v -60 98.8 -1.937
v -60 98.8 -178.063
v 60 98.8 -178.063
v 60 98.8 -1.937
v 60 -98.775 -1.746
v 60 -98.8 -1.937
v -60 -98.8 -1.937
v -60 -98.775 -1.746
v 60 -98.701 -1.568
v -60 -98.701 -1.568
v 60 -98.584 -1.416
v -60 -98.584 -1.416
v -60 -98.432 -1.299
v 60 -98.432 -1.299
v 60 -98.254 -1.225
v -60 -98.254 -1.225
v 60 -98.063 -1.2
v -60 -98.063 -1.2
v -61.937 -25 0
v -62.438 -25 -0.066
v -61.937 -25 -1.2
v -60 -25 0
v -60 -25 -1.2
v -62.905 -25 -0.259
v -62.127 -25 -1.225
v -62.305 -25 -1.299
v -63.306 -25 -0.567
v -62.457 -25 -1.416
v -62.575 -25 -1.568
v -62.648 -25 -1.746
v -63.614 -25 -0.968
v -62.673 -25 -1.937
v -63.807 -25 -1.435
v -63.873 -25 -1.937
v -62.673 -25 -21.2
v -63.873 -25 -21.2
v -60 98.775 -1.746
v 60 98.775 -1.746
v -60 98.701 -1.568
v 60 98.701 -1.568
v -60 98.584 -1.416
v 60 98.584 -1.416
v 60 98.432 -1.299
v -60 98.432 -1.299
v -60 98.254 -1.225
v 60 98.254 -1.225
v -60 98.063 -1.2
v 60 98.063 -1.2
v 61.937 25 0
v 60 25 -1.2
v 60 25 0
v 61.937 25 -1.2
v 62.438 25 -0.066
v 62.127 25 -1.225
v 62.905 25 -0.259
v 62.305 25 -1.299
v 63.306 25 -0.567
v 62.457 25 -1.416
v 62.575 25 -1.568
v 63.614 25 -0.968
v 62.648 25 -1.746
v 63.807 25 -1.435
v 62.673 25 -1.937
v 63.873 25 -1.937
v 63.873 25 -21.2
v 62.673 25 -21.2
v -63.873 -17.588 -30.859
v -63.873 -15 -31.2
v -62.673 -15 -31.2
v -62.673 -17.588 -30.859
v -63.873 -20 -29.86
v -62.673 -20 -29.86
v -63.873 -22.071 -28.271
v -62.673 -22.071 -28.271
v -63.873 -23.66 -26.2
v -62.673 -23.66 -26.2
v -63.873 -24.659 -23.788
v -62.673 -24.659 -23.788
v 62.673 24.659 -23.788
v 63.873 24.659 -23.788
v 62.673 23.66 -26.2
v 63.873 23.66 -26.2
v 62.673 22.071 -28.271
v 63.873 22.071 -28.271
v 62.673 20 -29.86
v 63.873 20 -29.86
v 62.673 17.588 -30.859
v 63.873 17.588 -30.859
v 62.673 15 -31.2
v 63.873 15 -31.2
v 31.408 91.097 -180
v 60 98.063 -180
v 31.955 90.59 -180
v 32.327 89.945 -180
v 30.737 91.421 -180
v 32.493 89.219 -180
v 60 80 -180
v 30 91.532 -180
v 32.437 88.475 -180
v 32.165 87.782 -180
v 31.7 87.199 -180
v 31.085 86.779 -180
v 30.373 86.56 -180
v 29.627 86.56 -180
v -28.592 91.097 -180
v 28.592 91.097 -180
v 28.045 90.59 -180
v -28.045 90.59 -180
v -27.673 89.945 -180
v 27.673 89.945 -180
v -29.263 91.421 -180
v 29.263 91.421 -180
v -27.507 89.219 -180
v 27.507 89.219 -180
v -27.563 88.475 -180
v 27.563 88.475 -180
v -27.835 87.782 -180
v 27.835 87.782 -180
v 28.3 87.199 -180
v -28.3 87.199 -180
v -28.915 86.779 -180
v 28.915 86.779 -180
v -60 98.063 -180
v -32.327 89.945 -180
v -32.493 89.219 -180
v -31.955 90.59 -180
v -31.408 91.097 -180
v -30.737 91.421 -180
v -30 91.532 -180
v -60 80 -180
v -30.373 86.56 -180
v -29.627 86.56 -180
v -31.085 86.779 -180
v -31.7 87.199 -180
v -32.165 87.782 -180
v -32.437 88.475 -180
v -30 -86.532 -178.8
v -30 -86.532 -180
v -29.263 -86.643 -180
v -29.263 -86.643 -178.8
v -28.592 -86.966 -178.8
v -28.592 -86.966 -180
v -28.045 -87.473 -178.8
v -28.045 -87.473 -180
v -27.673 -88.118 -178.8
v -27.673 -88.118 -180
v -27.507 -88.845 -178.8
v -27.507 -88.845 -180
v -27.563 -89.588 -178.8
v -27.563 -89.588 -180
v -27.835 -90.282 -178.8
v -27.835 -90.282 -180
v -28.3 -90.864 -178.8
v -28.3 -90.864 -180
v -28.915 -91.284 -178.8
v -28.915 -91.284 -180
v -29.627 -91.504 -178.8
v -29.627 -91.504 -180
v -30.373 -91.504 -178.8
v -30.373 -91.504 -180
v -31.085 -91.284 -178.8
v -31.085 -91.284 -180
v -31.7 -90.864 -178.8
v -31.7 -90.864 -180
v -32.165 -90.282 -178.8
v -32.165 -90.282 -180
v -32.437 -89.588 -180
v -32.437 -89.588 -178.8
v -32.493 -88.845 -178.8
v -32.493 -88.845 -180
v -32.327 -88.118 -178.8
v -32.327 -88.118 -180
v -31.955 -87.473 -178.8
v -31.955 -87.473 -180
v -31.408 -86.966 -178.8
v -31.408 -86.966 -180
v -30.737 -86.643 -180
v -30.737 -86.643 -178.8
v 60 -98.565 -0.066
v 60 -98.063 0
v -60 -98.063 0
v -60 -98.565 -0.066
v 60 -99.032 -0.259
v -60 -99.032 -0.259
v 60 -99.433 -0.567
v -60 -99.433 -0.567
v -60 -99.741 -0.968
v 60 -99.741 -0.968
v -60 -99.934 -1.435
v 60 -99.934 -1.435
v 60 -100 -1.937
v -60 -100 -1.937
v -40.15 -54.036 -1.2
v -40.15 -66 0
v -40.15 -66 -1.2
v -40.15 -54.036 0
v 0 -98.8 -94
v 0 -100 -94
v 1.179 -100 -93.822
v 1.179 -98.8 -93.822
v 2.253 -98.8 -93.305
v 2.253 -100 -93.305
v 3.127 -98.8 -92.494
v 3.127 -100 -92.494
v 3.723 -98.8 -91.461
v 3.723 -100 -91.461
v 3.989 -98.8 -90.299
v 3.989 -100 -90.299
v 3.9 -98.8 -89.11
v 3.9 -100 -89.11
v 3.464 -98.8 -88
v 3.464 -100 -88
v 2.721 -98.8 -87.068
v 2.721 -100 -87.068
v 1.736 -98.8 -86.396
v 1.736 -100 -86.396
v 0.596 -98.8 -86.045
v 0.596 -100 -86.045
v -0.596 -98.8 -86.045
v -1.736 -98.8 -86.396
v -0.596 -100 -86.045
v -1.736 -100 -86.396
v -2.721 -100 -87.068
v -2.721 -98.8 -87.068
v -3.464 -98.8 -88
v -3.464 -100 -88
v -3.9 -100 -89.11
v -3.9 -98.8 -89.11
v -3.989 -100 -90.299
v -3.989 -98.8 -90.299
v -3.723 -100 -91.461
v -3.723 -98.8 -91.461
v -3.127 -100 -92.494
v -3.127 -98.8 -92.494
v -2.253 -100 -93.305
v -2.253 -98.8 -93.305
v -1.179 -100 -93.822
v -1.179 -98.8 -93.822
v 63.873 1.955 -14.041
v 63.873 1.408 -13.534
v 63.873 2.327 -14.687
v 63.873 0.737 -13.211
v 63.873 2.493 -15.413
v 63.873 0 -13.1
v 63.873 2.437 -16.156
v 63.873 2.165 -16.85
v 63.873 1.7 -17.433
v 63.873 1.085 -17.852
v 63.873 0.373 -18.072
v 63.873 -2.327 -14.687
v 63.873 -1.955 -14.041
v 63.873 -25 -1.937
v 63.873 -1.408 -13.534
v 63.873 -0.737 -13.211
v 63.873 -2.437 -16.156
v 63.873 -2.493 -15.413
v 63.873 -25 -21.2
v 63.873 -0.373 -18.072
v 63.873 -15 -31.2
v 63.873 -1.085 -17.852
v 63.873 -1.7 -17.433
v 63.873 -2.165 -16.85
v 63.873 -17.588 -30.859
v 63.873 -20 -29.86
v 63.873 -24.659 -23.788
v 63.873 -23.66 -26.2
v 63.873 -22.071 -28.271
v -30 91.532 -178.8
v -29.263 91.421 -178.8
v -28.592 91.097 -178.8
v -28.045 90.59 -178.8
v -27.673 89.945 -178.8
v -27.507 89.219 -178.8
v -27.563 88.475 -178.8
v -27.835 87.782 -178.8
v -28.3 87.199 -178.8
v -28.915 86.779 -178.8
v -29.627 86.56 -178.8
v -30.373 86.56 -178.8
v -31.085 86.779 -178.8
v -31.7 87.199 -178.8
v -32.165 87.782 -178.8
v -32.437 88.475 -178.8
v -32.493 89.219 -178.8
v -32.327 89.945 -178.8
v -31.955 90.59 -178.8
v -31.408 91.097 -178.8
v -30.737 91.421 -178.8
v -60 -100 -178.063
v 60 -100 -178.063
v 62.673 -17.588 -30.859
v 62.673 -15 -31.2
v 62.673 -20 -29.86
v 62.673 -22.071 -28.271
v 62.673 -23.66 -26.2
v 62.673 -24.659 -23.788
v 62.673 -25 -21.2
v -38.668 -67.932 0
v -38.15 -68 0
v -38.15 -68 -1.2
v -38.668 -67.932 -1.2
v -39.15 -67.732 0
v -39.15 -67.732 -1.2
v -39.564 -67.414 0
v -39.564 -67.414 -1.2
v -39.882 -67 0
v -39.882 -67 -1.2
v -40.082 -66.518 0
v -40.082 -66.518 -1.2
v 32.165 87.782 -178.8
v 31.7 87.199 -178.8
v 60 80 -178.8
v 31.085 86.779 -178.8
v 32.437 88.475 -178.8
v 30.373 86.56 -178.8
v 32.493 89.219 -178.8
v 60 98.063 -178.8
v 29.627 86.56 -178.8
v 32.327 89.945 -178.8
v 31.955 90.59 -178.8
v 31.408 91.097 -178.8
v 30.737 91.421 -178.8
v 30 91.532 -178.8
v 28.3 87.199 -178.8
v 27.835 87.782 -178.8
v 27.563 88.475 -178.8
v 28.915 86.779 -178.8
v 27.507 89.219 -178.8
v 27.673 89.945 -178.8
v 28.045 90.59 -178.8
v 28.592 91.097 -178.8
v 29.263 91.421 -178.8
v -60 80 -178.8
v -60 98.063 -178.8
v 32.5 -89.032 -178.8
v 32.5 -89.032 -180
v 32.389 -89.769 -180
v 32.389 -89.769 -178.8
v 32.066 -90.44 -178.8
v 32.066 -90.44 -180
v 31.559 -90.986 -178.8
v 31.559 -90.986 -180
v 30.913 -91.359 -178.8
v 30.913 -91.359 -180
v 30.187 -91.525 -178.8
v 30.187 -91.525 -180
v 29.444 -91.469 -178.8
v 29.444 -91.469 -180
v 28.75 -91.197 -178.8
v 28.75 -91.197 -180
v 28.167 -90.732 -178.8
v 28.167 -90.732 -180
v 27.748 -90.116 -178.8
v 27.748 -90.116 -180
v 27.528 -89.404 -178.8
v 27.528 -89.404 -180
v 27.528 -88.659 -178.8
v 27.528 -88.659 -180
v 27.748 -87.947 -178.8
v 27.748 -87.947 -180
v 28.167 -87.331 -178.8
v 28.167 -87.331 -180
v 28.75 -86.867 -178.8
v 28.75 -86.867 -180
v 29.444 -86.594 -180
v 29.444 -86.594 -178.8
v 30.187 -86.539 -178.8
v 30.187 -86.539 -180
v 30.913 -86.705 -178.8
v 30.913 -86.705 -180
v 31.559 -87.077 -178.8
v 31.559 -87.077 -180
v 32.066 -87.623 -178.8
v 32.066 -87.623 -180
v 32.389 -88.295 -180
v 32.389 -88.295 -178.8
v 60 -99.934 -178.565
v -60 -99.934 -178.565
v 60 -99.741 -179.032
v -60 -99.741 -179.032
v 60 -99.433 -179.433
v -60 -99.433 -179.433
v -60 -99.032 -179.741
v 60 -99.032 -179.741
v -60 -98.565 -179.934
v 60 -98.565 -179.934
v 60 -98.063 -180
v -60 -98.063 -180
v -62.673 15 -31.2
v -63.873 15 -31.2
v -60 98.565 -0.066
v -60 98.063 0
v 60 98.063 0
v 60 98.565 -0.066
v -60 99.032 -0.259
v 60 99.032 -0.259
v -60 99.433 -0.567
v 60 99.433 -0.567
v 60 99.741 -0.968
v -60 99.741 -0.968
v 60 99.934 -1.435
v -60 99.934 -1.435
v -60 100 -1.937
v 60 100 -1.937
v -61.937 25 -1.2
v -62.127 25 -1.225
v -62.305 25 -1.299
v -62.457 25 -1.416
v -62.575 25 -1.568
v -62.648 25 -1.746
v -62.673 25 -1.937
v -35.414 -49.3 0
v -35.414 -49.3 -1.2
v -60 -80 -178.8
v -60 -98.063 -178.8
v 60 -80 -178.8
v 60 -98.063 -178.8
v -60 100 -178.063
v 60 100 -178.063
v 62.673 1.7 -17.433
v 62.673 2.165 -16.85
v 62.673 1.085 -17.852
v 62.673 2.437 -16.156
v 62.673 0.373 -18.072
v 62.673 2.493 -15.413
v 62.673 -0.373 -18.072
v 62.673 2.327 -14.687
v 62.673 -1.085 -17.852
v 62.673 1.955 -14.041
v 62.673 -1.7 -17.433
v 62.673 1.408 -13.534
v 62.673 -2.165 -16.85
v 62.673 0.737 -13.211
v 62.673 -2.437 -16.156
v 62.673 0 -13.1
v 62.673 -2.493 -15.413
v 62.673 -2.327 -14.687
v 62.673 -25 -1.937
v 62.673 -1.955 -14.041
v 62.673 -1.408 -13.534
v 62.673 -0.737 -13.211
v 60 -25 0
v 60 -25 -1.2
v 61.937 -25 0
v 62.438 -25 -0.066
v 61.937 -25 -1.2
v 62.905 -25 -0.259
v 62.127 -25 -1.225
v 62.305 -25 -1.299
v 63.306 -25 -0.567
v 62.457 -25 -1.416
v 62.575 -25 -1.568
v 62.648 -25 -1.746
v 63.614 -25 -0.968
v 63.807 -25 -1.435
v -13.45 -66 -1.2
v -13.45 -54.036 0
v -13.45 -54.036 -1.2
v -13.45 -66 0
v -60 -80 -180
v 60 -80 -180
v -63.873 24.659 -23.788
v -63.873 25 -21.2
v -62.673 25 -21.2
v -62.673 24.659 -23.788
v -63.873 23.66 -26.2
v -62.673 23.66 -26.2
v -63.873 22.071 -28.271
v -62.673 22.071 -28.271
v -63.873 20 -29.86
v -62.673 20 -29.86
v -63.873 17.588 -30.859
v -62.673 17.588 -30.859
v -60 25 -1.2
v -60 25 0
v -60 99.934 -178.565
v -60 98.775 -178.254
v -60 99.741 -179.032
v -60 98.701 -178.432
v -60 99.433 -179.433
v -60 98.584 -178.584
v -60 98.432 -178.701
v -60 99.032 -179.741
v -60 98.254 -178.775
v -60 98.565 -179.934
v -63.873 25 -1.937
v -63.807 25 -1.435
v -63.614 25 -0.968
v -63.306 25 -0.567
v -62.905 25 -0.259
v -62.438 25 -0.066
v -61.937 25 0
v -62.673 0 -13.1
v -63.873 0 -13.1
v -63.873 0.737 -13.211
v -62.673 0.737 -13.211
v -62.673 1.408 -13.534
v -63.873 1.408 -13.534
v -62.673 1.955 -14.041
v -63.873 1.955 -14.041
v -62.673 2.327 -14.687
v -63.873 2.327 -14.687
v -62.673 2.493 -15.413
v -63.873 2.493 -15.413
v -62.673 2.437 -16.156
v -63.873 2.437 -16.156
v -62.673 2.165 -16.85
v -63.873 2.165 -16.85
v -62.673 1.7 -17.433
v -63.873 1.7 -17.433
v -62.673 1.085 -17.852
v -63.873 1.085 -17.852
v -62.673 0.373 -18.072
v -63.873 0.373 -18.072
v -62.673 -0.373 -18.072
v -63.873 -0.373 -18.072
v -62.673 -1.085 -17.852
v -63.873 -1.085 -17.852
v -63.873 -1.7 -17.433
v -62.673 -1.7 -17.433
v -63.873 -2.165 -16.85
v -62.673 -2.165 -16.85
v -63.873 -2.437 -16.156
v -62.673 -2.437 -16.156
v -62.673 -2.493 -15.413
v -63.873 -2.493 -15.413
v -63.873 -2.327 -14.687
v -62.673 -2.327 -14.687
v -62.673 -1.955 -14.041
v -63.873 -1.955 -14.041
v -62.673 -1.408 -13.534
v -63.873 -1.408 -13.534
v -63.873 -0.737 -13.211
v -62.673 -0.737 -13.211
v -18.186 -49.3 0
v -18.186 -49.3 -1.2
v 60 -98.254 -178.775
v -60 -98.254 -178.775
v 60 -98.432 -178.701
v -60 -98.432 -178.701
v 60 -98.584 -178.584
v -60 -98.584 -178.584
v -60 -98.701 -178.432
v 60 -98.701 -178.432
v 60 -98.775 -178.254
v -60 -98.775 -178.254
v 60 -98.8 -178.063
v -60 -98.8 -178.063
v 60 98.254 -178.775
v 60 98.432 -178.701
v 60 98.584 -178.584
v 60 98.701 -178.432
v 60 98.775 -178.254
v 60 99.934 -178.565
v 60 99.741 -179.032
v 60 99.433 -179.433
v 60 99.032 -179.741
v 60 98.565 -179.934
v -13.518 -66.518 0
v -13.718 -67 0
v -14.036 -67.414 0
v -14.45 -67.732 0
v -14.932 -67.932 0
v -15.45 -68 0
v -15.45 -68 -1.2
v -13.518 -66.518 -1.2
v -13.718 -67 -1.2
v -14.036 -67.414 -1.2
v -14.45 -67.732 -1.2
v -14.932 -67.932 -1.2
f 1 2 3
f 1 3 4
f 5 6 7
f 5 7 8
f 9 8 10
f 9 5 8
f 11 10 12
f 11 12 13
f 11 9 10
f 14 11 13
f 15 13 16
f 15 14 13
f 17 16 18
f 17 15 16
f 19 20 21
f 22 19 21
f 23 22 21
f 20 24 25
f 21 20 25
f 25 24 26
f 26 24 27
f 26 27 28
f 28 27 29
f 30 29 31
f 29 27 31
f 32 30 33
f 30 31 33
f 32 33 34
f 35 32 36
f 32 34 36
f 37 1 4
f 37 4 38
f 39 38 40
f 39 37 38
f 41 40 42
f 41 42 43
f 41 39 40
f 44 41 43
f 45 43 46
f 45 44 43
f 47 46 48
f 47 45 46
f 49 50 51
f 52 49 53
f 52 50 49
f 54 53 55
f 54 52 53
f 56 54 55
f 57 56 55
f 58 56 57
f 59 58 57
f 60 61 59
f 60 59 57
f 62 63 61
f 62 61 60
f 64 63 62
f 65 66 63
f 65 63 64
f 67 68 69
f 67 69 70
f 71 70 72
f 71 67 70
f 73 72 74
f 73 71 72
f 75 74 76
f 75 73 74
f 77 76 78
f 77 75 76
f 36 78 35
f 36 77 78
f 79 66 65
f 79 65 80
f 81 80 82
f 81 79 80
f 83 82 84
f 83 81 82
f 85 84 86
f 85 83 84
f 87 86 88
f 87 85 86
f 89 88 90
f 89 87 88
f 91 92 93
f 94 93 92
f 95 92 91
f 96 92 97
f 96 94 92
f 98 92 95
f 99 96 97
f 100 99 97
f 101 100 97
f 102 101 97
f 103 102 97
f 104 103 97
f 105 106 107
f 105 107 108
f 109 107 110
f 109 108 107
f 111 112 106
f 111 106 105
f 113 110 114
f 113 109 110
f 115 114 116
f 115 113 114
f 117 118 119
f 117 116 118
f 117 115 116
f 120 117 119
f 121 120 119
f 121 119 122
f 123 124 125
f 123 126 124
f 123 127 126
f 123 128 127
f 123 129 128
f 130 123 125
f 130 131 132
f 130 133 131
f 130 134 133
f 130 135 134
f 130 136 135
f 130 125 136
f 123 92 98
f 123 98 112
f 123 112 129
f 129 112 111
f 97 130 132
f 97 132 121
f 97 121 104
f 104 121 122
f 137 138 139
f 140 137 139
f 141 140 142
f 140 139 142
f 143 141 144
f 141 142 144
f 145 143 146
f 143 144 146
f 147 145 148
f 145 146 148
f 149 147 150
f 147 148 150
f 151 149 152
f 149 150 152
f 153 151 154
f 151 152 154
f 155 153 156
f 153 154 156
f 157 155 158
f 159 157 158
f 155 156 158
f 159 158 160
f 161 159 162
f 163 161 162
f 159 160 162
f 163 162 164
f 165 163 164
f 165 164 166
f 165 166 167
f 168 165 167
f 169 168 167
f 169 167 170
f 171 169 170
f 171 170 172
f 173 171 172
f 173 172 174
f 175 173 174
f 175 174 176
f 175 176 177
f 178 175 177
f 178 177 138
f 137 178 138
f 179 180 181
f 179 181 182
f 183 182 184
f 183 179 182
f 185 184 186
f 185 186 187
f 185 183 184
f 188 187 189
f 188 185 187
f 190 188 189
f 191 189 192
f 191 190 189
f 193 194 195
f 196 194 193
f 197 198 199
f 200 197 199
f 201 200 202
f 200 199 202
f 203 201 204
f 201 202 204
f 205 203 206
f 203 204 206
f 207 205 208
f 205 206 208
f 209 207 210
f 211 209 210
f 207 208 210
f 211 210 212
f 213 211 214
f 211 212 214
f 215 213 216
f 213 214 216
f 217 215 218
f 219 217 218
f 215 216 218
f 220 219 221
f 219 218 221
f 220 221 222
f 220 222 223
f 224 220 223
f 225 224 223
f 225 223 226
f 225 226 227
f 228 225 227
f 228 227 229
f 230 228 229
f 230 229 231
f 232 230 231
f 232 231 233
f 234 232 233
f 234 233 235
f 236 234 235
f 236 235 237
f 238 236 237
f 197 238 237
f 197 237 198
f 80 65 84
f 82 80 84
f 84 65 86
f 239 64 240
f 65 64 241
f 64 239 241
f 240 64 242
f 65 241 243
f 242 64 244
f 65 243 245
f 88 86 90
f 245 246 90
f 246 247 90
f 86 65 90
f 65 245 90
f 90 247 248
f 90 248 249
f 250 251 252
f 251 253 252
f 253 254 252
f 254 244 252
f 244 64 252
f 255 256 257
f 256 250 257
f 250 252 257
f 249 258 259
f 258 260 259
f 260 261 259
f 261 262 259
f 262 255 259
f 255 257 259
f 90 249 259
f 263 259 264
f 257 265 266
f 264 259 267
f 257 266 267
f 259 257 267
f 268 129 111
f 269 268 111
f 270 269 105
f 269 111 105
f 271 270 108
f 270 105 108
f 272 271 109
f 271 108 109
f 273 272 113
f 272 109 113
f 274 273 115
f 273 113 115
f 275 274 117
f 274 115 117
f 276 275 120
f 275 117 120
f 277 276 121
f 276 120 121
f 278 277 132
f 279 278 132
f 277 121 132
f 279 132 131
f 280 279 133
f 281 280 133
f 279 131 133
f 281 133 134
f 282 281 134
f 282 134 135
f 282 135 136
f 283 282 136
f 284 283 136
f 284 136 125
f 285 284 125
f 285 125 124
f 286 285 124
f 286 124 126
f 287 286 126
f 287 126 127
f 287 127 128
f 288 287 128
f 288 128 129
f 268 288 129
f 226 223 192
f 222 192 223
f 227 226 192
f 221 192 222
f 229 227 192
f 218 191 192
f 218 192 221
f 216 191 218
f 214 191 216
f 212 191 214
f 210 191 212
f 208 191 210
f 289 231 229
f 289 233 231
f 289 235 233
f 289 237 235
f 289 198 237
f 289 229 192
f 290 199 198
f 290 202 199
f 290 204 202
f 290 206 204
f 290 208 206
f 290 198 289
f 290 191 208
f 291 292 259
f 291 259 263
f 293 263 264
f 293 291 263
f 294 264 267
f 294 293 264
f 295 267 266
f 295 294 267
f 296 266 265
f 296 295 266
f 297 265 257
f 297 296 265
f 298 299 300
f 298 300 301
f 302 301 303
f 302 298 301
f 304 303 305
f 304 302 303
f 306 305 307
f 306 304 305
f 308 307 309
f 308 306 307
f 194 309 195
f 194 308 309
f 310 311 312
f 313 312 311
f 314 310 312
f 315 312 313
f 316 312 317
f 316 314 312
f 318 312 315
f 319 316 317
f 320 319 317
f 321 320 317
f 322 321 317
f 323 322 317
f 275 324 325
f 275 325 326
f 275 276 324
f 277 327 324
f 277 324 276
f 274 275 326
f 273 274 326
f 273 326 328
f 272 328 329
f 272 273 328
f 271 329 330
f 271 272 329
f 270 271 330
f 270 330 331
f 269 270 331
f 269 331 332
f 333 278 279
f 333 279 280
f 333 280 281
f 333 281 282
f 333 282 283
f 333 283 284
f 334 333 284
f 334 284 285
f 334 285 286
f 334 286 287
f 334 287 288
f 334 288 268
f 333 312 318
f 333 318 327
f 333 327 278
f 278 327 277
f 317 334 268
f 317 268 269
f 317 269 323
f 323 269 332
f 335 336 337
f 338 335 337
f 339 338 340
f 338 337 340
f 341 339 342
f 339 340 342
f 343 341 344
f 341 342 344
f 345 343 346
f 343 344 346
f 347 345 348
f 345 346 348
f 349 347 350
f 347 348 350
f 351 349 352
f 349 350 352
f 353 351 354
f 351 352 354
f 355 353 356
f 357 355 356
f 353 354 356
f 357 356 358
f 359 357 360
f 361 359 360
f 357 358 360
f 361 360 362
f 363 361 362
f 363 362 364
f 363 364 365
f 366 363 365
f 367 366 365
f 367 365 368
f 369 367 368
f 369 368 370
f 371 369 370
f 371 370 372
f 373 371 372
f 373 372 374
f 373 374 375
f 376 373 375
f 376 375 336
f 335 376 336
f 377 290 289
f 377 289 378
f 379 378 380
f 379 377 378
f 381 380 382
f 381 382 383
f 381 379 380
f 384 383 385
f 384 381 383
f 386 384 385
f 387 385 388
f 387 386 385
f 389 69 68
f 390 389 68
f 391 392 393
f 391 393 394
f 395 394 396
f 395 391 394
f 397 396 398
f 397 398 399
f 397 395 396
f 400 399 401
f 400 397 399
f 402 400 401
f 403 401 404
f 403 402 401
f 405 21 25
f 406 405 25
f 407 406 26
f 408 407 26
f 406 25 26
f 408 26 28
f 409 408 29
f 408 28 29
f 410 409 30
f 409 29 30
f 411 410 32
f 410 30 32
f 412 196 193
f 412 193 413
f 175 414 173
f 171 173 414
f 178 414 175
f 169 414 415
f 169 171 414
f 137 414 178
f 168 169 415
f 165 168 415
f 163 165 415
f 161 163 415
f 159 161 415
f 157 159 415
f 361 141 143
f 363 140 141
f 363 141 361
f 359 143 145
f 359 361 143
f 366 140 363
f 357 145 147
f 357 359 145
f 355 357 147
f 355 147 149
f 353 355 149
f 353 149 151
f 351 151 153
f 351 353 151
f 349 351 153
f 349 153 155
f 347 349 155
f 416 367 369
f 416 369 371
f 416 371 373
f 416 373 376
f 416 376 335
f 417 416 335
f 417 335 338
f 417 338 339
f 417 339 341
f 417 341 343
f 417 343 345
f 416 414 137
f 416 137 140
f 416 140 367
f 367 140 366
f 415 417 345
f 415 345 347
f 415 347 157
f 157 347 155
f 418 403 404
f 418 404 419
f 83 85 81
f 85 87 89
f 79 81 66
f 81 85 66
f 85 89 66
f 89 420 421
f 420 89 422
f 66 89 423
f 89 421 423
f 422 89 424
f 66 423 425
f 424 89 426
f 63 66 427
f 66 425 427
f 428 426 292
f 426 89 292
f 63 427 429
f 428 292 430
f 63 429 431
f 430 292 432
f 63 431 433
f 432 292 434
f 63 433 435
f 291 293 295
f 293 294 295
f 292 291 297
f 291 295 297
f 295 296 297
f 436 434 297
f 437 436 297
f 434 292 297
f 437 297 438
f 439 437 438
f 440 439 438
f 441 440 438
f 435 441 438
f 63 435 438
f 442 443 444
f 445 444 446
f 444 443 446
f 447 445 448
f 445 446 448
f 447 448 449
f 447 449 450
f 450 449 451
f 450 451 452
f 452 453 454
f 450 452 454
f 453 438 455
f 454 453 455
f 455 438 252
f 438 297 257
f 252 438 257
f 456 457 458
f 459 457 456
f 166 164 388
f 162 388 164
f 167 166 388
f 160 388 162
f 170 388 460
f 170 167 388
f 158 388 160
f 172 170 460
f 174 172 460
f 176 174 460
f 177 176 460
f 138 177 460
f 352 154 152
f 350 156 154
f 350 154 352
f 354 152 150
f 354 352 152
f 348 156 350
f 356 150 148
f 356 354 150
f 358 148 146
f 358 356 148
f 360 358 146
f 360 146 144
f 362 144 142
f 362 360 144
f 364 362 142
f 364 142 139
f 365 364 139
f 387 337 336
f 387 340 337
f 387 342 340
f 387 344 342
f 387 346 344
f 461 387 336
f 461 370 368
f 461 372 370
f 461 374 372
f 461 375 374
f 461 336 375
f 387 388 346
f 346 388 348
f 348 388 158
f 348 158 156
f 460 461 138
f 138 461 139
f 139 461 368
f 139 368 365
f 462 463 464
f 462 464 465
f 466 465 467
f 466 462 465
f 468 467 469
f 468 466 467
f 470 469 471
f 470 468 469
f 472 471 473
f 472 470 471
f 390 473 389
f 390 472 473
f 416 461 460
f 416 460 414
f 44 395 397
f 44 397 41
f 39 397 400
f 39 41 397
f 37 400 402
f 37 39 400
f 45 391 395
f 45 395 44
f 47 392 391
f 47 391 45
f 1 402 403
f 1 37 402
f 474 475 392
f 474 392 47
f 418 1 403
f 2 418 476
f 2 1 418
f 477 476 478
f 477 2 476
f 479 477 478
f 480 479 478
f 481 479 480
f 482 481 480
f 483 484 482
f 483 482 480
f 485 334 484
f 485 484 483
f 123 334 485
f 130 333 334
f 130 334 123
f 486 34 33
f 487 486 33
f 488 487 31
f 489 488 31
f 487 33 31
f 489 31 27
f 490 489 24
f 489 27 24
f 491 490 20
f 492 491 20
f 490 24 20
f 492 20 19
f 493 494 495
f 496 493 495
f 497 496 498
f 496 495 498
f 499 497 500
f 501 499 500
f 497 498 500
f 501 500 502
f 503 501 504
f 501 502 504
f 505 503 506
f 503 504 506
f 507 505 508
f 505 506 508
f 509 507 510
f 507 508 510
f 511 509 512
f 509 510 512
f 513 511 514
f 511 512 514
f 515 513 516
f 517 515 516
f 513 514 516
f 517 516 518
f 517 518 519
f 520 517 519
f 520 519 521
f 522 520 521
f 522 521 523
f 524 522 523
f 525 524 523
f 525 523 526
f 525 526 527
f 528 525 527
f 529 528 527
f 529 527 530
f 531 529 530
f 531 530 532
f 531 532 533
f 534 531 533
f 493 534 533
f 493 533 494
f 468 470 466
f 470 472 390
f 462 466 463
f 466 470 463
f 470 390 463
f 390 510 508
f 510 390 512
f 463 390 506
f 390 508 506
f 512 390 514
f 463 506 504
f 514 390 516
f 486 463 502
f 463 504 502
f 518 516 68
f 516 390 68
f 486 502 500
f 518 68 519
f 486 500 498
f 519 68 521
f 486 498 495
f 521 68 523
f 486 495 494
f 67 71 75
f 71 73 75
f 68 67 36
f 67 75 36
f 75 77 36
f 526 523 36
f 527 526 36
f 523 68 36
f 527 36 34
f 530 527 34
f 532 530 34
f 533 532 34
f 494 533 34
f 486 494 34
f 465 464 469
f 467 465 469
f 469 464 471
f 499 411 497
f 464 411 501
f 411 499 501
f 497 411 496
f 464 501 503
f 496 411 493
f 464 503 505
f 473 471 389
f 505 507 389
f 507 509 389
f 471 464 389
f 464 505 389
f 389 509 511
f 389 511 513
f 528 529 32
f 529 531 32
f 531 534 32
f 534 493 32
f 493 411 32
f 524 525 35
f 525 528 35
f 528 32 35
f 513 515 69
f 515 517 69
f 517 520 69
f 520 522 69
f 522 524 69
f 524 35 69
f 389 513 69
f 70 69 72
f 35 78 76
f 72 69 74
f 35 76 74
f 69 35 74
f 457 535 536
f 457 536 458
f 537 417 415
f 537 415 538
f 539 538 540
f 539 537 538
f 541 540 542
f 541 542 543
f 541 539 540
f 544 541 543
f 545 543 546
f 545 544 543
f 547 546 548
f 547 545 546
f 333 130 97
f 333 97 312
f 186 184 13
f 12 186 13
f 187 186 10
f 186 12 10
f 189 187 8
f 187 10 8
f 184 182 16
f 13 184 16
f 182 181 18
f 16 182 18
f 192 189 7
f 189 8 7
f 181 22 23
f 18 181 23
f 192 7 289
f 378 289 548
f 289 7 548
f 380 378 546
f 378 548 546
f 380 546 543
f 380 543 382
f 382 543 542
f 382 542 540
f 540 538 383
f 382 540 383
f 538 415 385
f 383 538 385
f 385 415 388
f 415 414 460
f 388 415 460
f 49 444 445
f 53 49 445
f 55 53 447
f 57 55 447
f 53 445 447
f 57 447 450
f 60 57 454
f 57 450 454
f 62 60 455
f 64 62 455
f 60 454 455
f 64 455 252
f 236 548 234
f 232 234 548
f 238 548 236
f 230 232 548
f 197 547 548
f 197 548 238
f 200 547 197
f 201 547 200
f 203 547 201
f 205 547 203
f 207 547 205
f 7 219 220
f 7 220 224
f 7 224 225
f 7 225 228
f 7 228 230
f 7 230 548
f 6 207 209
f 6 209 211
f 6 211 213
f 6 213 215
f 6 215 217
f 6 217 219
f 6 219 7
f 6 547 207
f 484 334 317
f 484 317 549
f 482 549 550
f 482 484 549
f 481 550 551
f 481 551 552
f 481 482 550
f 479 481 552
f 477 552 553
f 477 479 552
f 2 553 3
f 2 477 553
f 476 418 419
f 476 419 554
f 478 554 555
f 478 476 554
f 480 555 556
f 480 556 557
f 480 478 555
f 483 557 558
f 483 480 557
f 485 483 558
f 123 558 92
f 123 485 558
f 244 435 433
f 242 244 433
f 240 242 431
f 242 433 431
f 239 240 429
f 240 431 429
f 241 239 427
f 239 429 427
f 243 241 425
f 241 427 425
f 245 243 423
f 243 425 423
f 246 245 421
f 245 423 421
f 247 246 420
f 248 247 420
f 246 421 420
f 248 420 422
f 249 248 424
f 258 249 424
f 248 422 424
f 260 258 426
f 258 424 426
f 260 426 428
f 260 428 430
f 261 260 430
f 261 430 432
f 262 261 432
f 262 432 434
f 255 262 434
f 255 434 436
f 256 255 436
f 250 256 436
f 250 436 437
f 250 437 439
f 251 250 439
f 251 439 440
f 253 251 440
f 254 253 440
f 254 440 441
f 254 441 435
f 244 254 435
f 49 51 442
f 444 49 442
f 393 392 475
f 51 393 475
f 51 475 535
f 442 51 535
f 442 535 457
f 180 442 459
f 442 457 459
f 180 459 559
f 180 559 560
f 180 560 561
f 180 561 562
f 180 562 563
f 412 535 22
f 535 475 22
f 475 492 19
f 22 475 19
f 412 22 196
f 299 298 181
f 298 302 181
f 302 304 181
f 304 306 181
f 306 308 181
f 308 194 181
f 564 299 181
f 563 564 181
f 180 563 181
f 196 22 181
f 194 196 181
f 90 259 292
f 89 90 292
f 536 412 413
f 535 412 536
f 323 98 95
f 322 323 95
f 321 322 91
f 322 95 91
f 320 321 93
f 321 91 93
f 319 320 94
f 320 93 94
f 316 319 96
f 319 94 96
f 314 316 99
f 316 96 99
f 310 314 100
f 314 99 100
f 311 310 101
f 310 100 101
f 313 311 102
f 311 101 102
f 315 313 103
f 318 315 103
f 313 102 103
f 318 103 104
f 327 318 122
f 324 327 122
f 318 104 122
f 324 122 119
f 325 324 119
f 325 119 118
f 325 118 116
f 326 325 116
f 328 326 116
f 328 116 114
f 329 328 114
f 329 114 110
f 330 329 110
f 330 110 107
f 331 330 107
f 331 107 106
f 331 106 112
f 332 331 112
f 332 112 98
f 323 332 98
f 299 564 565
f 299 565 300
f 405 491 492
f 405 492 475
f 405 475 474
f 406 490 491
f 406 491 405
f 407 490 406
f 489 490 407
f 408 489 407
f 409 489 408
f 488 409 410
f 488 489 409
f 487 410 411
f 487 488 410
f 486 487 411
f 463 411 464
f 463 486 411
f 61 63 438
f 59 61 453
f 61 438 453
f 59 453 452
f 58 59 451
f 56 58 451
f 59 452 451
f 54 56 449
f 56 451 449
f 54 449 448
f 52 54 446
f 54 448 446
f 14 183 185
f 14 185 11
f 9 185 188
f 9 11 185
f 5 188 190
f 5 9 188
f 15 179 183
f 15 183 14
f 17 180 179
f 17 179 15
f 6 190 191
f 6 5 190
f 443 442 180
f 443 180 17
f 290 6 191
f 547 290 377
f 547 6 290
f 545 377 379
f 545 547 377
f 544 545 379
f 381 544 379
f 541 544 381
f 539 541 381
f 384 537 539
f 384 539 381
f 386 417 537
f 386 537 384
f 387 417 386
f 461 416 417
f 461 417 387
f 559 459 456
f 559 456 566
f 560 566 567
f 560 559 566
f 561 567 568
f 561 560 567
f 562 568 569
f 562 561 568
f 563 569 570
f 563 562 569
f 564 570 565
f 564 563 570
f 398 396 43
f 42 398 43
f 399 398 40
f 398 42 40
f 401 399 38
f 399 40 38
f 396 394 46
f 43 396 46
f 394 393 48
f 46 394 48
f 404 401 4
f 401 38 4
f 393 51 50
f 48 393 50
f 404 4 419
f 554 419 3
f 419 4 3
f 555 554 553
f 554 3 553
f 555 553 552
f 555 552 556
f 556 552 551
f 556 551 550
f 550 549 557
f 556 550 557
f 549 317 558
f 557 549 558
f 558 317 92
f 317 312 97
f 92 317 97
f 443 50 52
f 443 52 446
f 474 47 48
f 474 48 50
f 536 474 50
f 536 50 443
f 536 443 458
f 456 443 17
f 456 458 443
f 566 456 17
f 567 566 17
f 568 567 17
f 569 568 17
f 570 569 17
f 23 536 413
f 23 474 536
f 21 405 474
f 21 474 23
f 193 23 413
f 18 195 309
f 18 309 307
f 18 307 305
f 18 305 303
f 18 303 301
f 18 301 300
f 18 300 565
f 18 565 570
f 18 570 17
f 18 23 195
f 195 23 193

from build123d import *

# Parameters (mm, degrees)
SKETCH1_W                      = 120
SKETCH1_H                      = 200
BASE_FLANGE1_DEPTH             = 1.2
EDGE_FLANGE1_STRIP_W           = 6.2732
EDGE_FLANGE1_STRIP_H           = 1.2
EDGE_FLANGE1_STRIP_CUT_DEPTH   = 120
EDGE_FLANGE1_STRIP_2_W         = 6.2732
EDGE_FLANGE1_STRIP_2_H         = 1.2
EDGE_FLANGE1_STRIP_CUT_2_DEPTH = 120
EDGE_FLANGE1_DEPTH             = 120
EDGE_FLANGE1_BEND_DEPTH        = 120
EDGE_FLANGE3_START             = -121.9366
EDGE_FLANGE3_OUTLINE_W         = 50
EDGE_FLANGE3_OUTLINE_H         = 1.2
EDGE_FLANGE3_DEPTH             = 123.8732
EDGE_FLANGE3_START_2           = -25
EDGE_FLANGE3_2_DEPTH           = 50
EDGE_FLANGE3_START_3           = -65
EDGE_FLANGE3_3_DEPTH           = 130
EDGE_FLANGE4_STRIP_W           = 6.2732
EDGE_FLANGE4_STRIP_H           = 1.2
EDGE_FLANGE4_STRIP_CUT_DEPTH   = 120
EDGE_FLANGE4_STRIP_2_W         = 6.2732
EDGE_FLANGE4_STRIP_2_H         = 1.2
EDGE_FLANGE4_STRIP_CUT_2_DEPTH = 120
EDGE_FLANGE4_DEPTH             = 120
EDGE_FLANGE4_BEND_DEPTH        = 120
SKETCH34_R                     = 4
CUT_EXTRUDE1_DEPTH             = 10
CUT_EXTRUDE2_DEPTH             = 10
SKETCH36_R                     = 2.5
CUT_EXTRUDE3_DEPTH             = 243.320330787
SKETCH37_R                     = 2.5
CUT_EXTRUDE4_DEPTH             = 10


with BuildPart() as part:
    # Base-Flange1: sheet metal written as solids
    # Sketch1 → Base-Flange1 (new body)
    with BuildSketch(Plane.XY):
        Rectangle(SKETCH1_W, SKETCH1_H)
    extrude(amount=-BASE_FLANGE1_DEPTH)

    # Edge-Flange1: sheet metal written as solids
    # Edge-Flange1 strip (on a plane across the edge) → Edge-Flange1 strip cut (cut)
    with BuildSketch(Plane(origin=(-60, 100, -1.2), x_dir=(0, -1, 0), z_dir=(1, 0, 0))):
        with Locations((-1.2, -0.6)):
            Rectangle(EDGE_FLANGE1_STRIP_W, EDGE_FLANGE1_STRIP_H)
    extrude(amount=EDGE_FLANGE1_STRIP_CUT_DEPTH, mode=Mode.SUBTRACT)

    # Edge-Flange1 strip 2 (on a plane across the edge) → Edge-Flange1 strip cut 2 (cut)
    with BuildSketch(Plane(origin=(60, -100, -1.2), x_dir=(0, 1, 0), z_dir=(-1, 0, 0))):
        with Locations((-1.2, -0.6)):
            Rectangle(EDGE_FLANGE1_STRIP_2_W, EDGE_FLANGE1_STRIP_2_H)
    extrude(amount=EDGE_FLANGE1_STRIP_CUT_2_DEPTH, mode=Mode.SUBTRACT)

    # Edge-Flange1 section (on a plane across the edge) → Edge-Flange1 (add)
    with BuildSketch(Plane(origin=(-60, 100, -1.2), x_dir=(0, -1, 0), z_dir=(1, 0, 0))):
        with BuildLine():
            Line((0, 0.7366), (0, 178.8))
            Line((0, 178.8), (1.2, 178.8))
            Line((1.2, 178.8), (1.2, 0.7366))
            ThreePointArc((1.2, 0.7366), (1.415745145, 0.215745145), (1.9366, 0))
            Line((1.9366, 0), (1.9366, -1.2))
            ThreePointArc((1.9366, -1.2), (0.567217008, -0.632782992), (0, 0.7366))
        make_face()
    extrude(amount=EDGE_FLANGE1_DEPTH)

    # Edge-Flange1 section 2 (on a plane across the edge) → Edge-Flange1 bend (add)
    with BuildSketch(Plane(origin=(60, -100, -1.2), x_dir=(0, 1, 0), z_dir=(-1, 0, 0))):
        with BuildLine():
            Line((0, 0.7366), (0, 178.8))
            Line((0, 178.8), (1.2, 178.8))
            Line((1.2, 178.8), (1.2, 0.7366))
            ThreePointArc((1.2, 0.7366), (1.415745145, 0.215745145), (1.9366, 0))
            Line((1.9366, 0), (1.9366, -1.2))
            ThreePointArc((1.9366, -1.2), (0.567217008, -0.632782992), (0, 0.7366))
        make_face()
    extrude(amount=EDGE_FLANGE1_BEND_DEPTH)

    # Edge-Flange3: read off the stored shape, not the designer's step
    # Edge-Flange3 outline → Edge-Flange3 (add)
    with BuildSketch(Plane(origin=(60, 0, -1.2), x_dir=(0, -1, 0), z_dir=(1, 0, 0)).offset(EDGE_FLANGE3_START)):
        with Locations((0, -0.6)):
            Rectangle(EDGE_FLANGE3_OUTLINE_W, EDGE_FLANGE3_OUTLINE_H)
    extrude(amount=EDGE_FLANGE3_DEPTH)

    # Edge-Flange3 2 outline → Edge-Flange3 2 (add)
    with BuildSketch(Plane(origin=(0, 0, 0), x_dir=(1, 0, 0), z_dir=(0, 1, 0)).offset(EDGE_FLANGE3_START_2)):
        with BuildLine():
            ThreePointArc((61.9366, 0), (63.305982992, 0.567217008), (63.8732, 1.9366))
            Line((63.8732, 1.9366), (63.8732, 31.2))
            Line((63.8732, 31.2), (62.6732, 31.2))
            Line((62.6732, 31.2), (62.6732, 1.9366))
            ThreePointArc((62.6732, 1.9366), (62.457454855, 1.415745145), (61.9366, 1.2))
            Line((61.9366, 1.2), (61.9366, 0))
        make_face()
        with BuildLine():
            Line((-62.6732, 31.2), (-63.8732, 31.2))
            Line((-63.8732, 31.2), (-63.8732, 1.9366))
            ThreePointArc((-63.8732, 1.9366), (-63.305982992, 0.567217008), (-61.9366, 0))
            Line((-61.9366, 0), (-61.9366, 1.2))
            ThreePointArc((-61.9366, 1.2), (-62.457454855, 1.415745145), (-62.6732, 1.9366))
            Line((-62.6732, 1.9366), (-62.6732, 31.2))
        make_face()
    extrude(amount=EDGE_FLANGE3_2_DEPTH)

    # Edge-Flange3 3 outline → Edge-Flange3 3 (cut)
    with BuildSketch(Plane.YZ.offset(EDGE_FLANGE3_START_3)):
        with BuildLine():
            Line((-25, -31.2), (-15, -31.2))
            ThreePointArc((-15, -31.2), (-22.071067812, -28.271067812), (-25, -21.2))
            Line((-25, -21.2), (-25, -31.2))
        make_face()
        with BuildLine():
            ThreePointArc((25, -21.2), (22.071067812, -28.271067812), (15, -31.2))
            Line((15, -31.2), (25, -31.2))
            Line((25, -31.2), (25, -21.2))
        make_face()
    extrude(amount=EDGE_FLANGE3_3_DEPTH, mode=Mode.SUBTRACT)

    # Edge-Flange4: sheet metal written as solids
    # Edge-Flange4 strip (on a plane across the edge) → Edge-Flange4 strip cut (cut)
    with BuildSketch(Plane(origin=(-60, 98.8, -180), x_dir=(0, 0, 1), z_dir=(1, 0, 0))):
        with Locations((-1.2, -0.6)):
            Rectangle(EDGE_FLANGE4_STRIP_W, EDGE_FLANGE4_STRIP_H)
    extrude(amount=EDGE_FLANGE4_STRIP_CUT_DEPTH, mode=Mode.SUBTRACT)

    # Edge-Flange4 strip 2 (on a plane across the edge) → Edge-Flange4 strip cut 2 (cut)
    with BuildSketch(Plane(origin=(60, -98.8, -180), x_dir=(0, 0, 1), z_dir=(-1, 0, 0))):
        with Locations((-1.2, -0.6)):
            Rectangle(EDGE_FLANGE4_STRIP_2_W, EDGE_FLANGE4_STRIP_2_H)
    extrude(amount=EDGE_FLANGE4_STRIP_CUT_2_DEPTH, mode=Mode.SUBTRACT)

    # Edge-Flange4 section (on a plane across the edge) → Edge-Flange4 (add)
    with BuildSketch(Plane(origin=(-60, 98.8, -180), x_dir=(0, 0, 1), z_dir=(1, 0, 0))):
        with BuildLine():
            Line((0, 0.7366), (0, 18.8))
            Line((0, 18.8), (1.2, 18.8))
            Line((1.2, 18.8), (1.2, 0.7366))
            ThreePointArc((1.2, 0.7366), (1.415745145, 0.215745145), (1.9366, 0))
            Line((1.9366, 0), (1.9366, -1.2))
            ThreePointArc((1.9366, -1.2), (0.567217008, -0.632782992), (0, 0.7366))
        make_face()
    extrude(amount=EDGE_FLANGE4_DEPTH)

    # Edge-Flange4 section 2 (on a plane across the edge) → Edge-Flange4 bend (add)
    with BuildSketch(Plane(origin=(60, -98.8, -180), x_dir=(0, 0, 1), z_dir=(-1, 0, 0))):
        with BuildLine():
            Line((0, 0.7366), (0, 18.8))
            Line((0, 18.8), (1.2, 18.8))
            Line((1.2, 18.8), (1.2, 0.7366))
            ThreePointArc((1.2, 0.7366), (1.415745145, 0.215745145), (1.9366, 0))
            Line((1.9366, 0), (1.9366, -1.2))
            ThreePointArc((1.9366, -1.2), (0.567217008, -0.632782992), (0, 0.7366))
        make_face()
    extrude(amount=EDGE_FLANGE4_BEND_DEPTH)

    # Sketch34 → Cut-Extrude1 (cut)
    with BuildSketch(Plane.XZ.offset(100)):
        with Locations(Location((0, -90, 0), (0, 0, 270))):
            Circle(SKETCH34_R)
    extrude(amount=-CUT_EXTRUDE1_DEPTH, mode=Mode.SUBTRACT)

    # Sketch35 → Cut-Extrude2 (cut)
    with BuildSketch(Plane.XY):
        with BuildLine():
            Line((-31.3, -68), (-38.15, -68))
            ThreePointArc((-38.15, -68), (-39.564213562, -67.414213562), (-40.15, -66))
            Line((-40.15, -66), (-40.15, -54.035786438))
            Line((-40.15, -54.035786438), (-35.414213562, -49.3))
            Line((-35.414213562, -49.3), (-18.185786438, -49.3))
            Line((-18.185786438, -49.3), (-13.45, -54.035786438))
            Line((-13.45, -54.035786438), (-13.45, -66))
            ThreePointArc((-13.45, -66), (-14.035786438, -67.414213562), (-15.45, -68))
            Line((-15.45, -68), (-22.3, -68))
            Line((-22.3, -68), (-22.55, -68))
            Line((-22.55, -68), (-31.05, -68))
            Line((-31.05, -68), (-31.3, -68))
        make_face()
    extrude(amount=-CUT_EXTRUDE2_DEPTH, mode=Mode.SUBTRACT)

    # Sketch36 → Cut-Extrude3 (cut, through all)
    with BuildSketch(Plane.ZY.offset(63.8732)):
        with Locations((-15.6, 0)):
            Circle(SKETCH36_R)
    extrude(amount=-CUT_EXTRUDE3_DEPTH, mode=Mode.SUBTRACT)

    # Sketch37 → Cut-Extrude4 (cut)
    with BuildSketch(Plane(origin=(0, 0, -180), x_dir=(-1, 0, 0), z_dir=(0, 0, -1))):
        with Locations(Location((-30, 89.0317, 0), (0, 0, 90))):
            Circle(SKETCH37_R)
        with Locations(Location((30, 89.0317, 0), (0, 0, 90))):
            Circle(SKETCH37_R)
        with Locations(Location((30, -89.0317, 0), (0, 0, 90))):
            Circle(SKETCH37_R)
        with Locations(Location((-30, -89.0317, 0), (0, 0, 180))):
            Circle(SKETCH37_R)
    extrude(amount=-CUT_EXTRUDE4_DEPTH, mode=Mode.SUBTRACT)


solid = part.part
